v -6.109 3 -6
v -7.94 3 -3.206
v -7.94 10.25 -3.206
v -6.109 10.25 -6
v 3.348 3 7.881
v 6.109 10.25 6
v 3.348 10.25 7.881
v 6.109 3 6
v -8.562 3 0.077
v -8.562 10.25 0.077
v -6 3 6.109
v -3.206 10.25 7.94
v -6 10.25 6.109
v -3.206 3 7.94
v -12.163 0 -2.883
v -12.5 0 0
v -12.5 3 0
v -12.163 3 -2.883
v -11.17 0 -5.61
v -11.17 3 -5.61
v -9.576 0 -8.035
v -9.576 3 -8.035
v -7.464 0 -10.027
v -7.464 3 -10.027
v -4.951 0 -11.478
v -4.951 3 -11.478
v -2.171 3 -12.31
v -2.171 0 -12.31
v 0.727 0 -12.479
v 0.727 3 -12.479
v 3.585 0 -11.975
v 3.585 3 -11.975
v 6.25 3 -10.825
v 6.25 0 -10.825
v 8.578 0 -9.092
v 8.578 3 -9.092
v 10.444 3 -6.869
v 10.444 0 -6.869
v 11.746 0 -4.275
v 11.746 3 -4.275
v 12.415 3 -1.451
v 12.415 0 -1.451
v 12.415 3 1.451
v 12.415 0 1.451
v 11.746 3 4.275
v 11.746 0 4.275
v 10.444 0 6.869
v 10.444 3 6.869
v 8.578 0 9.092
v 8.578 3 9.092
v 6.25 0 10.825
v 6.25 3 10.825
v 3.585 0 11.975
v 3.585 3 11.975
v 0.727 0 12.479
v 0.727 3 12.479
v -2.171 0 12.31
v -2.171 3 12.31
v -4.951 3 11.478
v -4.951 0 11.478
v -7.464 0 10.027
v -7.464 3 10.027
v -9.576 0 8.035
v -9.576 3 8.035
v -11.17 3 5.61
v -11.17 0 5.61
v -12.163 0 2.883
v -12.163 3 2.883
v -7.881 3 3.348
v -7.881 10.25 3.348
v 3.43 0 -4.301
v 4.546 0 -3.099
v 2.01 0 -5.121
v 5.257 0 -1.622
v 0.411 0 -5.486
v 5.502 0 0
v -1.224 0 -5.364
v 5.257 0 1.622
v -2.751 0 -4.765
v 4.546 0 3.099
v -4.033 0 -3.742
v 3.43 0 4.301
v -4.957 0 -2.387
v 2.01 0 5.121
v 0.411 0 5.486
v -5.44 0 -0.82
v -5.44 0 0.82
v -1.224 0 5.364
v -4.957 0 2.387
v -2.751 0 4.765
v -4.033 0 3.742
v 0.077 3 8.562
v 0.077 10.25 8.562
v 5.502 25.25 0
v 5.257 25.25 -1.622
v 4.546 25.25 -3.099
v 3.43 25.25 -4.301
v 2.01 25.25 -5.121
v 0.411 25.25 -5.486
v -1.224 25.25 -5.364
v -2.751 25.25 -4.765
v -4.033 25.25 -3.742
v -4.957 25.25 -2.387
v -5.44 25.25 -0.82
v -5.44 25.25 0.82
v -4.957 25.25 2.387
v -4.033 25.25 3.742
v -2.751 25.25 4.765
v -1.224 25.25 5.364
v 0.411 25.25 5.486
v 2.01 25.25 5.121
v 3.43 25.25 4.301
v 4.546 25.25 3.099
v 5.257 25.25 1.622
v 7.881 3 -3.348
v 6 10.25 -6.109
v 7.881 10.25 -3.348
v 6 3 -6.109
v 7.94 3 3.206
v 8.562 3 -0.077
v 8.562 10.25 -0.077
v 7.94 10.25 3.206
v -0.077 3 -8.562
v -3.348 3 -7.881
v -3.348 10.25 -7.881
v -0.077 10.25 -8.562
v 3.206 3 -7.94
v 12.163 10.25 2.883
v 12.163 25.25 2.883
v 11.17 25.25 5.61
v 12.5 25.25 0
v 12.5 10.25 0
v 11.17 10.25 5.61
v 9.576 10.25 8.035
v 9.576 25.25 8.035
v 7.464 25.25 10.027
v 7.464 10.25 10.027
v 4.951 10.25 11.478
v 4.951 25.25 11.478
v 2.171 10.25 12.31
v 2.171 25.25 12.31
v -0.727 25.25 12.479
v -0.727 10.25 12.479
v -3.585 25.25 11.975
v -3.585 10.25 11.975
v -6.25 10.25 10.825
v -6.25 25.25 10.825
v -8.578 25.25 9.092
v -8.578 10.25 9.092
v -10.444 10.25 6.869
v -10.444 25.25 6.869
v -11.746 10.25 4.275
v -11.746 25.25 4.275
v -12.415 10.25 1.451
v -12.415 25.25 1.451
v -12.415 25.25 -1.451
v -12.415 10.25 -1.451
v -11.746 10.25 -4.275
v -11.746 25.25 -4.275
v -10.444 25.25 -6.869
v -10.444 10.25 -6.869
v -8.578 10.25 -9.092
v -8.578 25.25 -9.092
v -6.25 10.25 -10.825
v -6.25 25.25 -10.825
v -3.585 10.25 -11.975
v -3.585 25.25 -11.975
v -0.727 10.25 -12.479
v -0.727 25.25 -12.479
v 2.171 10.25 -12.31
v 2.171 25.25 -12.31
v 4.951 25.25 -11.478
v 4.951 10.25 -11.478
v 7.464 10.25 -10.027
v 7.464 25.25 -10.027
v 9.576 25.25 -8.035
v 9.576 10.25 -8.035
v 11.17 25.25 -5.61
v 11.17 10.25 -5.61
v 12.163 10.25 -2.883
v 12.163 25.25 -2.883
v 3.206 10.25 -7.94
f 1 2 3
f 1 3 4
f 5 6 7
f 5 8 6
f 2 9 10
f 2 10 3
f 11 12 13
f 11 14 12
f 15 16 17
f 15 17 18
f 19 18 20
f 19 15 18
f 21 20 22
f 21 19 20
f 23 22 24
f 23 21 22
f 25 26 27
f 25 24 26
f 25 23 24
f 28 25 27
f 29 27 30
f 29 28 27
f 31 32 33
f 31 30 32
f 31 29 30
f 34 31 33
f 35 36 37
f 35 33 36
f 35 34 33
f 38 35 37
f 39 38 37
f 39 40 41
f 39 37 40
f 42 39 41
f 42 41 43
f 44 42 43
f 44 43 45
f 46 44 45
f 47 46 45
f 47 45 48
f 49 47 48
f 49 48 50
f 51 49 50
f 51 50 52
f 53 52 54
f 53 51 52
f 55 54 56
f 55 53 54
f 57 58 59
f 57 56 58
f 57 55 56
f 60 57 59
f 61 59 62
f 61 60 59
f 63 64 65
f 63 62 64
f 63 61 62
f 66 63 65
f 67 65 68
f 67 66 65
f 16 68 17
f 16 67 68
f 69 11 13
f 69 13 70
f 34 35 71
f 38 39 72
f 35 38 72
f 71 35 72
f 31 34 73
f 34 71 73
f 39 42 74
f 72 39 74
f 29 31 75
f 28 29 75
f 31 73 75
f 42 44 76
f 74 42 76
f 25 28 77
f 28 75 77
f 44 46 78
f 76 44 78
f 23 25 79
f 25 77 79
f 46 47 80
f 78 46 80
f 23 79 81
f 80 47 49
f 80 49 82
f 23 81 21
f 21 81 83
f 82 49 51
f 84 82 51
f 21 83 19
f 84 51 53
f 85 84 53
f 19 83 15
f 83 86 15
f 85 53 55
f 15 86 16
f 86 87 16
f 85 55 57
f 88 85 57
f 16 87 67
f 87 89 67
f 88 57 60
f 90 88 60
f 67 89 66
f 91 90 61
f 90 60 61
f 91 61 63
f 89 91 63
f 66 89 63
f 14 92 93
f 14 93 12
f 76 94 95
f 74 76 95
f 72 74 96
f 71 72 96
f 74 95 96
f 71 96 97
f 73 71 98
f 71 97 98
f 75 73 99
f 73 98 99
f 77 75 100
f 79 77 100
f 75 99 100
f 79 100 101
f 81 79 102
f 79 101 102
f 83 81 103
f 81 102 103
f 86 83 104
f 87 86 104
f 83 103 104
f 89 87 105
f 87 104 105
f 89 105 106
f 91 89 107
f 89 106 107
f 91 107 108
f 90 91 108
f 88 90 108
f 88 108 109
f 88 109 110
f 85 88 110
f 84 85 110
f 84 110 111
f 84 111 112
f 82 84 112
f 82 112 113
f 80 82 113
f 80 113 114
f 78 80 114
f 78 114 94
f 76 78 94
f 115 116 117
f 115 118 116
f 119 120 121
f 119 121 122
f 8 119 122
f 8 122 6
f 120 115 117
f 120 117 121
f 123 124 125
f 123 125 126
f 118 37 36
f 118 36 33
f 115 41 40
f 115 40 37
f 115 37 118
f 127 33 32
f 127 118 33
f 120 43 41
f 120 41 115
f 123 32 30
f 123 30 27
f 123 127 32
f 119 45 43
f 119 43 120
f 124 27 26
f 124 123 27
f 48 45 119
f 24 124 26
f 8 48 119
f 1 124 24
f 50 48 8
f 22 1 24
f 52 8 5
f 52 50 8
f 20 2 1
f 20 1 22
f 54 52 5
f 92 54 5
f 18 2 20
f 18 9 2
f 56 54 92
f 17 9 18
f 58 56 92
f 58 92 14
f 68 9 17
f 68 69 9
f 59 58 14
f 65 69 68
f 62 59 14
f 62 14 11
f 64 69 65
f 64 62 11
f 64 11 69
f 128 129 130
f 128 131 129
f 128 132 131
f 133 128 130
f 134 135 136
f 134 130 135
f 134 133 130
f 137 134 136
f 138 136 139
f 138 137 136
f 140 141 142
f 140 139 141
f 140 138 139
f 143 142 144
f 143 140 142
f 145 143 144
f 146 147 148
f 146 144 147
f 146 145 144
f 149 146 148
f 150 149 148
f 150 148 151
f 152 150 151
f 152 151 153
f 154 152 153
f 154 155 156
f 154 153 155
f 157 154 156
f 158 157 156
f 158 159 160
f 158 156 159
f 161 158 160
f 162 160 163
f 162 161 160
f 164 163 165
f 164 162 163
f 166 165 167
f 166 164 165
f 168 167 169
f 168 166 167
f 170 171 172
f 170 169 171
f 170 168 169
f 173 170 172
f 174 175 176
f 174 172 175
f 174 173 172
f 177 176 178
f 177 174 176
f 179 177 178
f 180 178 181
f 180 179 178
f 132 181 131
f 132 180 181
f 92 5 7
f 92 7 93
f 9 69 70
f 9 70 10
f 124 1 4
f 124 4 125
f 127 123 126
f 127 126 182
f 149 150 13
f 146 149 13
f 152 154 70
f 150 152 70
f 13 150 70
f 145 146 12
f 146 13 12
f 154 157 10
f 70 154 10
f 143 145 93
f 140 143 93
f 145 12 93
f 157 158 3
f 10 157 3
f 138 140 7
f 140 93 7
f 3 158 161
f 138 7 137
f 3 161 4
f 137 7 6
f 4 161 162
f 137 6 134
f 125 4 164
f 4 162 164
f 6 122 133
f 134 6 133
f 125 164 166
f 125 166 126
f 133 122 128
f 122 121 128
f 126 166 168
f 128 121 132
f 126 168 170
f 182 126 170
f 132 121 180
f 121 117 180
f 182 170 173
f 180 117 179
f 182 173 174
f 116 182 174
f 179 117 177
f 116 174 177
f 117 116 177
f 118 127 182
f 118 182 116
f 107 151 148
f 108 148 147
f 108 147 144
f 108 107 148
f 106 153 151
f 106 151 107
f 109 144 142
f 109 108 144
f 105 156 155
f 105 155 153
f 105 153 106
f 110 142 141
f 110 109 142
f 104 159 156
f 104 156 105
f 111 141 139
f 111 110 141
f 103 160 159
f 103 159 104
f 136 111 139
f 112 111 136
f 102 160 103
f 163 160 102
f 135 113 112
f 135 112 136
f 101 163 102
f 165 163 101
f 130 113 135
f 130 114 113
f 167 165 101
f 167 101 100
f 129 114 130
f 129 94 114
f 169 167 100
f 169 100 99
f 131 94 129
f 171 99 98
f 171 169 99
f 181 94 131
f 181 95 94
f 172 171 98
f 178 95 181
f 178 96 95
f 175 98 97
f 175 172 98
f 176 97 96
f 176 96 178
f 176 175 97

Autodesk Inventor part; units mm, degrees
ref_plane "YZ Plane" through (0, 0, 0) normal (1, 0, 0) x (0, 1, 0)
ref_plane "XZ Plane" through (0, 0, 0) normal (0, 1, 0) x (-1, 0, 0)
ref_plane "XY Plane" through (0, 0, 0) normal (0, 0, 1) x (1, 0, 0)
sketch "Szkic1" plane through (0, 0, 0) normal (0, 1, 0) x (-1, 0, 0)
  circle A0 centre (0, 0) radius 12.5
  dimension "d0" = 25
extrude "Wyciągnięcie proste1" add sketch "Szkic1" along normal blind 3
sketch "Szkic7" plane through (0, 3, 0) normal (0, 1, 0) x (1, 0, 0)
  line L0 (6, 6.109) -> (7.8811, 3.3479)
  line L1 (7.8811, 3.3479) -> (8.5624, 0.0771)
  line L2 (8.5624, 0.0771) -> (7.9401, -3.2055)
  line L3 (7.9401, -3.2055) -> (6.109, -6)
  line L4 (6.109, -6) -> (3.3479, -7.8811)
  line L5 (3.3479, -7.8811) -> (0.0771, -8.5624)
  line L6 (0.0771, -8.5624) -> (-3.2055, -7.9401)
  line L7 (-3.2055, -7.9401) -> (-6, -6.109)
  line L8 (-6, -6.109) -> (-7.8811, -3.3479)
  line L9 (-7.8811, -3.3479) -> (-8.5624, -0.0771)
  line L10 (-8.5624, -0.0771) -> (-7.9401, 3.2055)
  line L11 (-7.9401, 3.2055) -> (-6.109, 6)
  line L12 (-6.109, 6) -> (-3.3479, 7.8811)
  line L13 (-3.3479, 7.8811) -> (-0.0771, 8.5624)
  line L14 (-0.0771, 8.5624) -> (3.2055, 7.9401)
  line L15 (3.2055, 7.9401) -> (6, 6.109)
  point P0 (0, 0)
  point P1 (0, 0)
extrude "Wyciągnięcie proste6" add sketch "Szkic7" along normal blind 7.25
sketch "Szkic8" plane through (0, 10.25, 0) normal (0, 1, 0) x (1, 0, 0)
  circle A0 centre (0, 0) radius 12.5
extrude "Wyciągnięcie proste7" add sketch "Szkic8" along normal blind 15
sketch "Szkic9" plane through (0, 25.25, 0) normal (0, 1, 0) x (1, 0, 0)
  circle A0 centre (0, 0) radius 5.5016
extrude "Wyciągnięcie proste8" cut sketch "Szkic9" against normal blind 30
sketch "Szkic10" plane through (0, 25.25, 0) normal (0, 1, 0) x (1, 0, 0)
  point P0 (0, 0)
properties part number "spool_long"
